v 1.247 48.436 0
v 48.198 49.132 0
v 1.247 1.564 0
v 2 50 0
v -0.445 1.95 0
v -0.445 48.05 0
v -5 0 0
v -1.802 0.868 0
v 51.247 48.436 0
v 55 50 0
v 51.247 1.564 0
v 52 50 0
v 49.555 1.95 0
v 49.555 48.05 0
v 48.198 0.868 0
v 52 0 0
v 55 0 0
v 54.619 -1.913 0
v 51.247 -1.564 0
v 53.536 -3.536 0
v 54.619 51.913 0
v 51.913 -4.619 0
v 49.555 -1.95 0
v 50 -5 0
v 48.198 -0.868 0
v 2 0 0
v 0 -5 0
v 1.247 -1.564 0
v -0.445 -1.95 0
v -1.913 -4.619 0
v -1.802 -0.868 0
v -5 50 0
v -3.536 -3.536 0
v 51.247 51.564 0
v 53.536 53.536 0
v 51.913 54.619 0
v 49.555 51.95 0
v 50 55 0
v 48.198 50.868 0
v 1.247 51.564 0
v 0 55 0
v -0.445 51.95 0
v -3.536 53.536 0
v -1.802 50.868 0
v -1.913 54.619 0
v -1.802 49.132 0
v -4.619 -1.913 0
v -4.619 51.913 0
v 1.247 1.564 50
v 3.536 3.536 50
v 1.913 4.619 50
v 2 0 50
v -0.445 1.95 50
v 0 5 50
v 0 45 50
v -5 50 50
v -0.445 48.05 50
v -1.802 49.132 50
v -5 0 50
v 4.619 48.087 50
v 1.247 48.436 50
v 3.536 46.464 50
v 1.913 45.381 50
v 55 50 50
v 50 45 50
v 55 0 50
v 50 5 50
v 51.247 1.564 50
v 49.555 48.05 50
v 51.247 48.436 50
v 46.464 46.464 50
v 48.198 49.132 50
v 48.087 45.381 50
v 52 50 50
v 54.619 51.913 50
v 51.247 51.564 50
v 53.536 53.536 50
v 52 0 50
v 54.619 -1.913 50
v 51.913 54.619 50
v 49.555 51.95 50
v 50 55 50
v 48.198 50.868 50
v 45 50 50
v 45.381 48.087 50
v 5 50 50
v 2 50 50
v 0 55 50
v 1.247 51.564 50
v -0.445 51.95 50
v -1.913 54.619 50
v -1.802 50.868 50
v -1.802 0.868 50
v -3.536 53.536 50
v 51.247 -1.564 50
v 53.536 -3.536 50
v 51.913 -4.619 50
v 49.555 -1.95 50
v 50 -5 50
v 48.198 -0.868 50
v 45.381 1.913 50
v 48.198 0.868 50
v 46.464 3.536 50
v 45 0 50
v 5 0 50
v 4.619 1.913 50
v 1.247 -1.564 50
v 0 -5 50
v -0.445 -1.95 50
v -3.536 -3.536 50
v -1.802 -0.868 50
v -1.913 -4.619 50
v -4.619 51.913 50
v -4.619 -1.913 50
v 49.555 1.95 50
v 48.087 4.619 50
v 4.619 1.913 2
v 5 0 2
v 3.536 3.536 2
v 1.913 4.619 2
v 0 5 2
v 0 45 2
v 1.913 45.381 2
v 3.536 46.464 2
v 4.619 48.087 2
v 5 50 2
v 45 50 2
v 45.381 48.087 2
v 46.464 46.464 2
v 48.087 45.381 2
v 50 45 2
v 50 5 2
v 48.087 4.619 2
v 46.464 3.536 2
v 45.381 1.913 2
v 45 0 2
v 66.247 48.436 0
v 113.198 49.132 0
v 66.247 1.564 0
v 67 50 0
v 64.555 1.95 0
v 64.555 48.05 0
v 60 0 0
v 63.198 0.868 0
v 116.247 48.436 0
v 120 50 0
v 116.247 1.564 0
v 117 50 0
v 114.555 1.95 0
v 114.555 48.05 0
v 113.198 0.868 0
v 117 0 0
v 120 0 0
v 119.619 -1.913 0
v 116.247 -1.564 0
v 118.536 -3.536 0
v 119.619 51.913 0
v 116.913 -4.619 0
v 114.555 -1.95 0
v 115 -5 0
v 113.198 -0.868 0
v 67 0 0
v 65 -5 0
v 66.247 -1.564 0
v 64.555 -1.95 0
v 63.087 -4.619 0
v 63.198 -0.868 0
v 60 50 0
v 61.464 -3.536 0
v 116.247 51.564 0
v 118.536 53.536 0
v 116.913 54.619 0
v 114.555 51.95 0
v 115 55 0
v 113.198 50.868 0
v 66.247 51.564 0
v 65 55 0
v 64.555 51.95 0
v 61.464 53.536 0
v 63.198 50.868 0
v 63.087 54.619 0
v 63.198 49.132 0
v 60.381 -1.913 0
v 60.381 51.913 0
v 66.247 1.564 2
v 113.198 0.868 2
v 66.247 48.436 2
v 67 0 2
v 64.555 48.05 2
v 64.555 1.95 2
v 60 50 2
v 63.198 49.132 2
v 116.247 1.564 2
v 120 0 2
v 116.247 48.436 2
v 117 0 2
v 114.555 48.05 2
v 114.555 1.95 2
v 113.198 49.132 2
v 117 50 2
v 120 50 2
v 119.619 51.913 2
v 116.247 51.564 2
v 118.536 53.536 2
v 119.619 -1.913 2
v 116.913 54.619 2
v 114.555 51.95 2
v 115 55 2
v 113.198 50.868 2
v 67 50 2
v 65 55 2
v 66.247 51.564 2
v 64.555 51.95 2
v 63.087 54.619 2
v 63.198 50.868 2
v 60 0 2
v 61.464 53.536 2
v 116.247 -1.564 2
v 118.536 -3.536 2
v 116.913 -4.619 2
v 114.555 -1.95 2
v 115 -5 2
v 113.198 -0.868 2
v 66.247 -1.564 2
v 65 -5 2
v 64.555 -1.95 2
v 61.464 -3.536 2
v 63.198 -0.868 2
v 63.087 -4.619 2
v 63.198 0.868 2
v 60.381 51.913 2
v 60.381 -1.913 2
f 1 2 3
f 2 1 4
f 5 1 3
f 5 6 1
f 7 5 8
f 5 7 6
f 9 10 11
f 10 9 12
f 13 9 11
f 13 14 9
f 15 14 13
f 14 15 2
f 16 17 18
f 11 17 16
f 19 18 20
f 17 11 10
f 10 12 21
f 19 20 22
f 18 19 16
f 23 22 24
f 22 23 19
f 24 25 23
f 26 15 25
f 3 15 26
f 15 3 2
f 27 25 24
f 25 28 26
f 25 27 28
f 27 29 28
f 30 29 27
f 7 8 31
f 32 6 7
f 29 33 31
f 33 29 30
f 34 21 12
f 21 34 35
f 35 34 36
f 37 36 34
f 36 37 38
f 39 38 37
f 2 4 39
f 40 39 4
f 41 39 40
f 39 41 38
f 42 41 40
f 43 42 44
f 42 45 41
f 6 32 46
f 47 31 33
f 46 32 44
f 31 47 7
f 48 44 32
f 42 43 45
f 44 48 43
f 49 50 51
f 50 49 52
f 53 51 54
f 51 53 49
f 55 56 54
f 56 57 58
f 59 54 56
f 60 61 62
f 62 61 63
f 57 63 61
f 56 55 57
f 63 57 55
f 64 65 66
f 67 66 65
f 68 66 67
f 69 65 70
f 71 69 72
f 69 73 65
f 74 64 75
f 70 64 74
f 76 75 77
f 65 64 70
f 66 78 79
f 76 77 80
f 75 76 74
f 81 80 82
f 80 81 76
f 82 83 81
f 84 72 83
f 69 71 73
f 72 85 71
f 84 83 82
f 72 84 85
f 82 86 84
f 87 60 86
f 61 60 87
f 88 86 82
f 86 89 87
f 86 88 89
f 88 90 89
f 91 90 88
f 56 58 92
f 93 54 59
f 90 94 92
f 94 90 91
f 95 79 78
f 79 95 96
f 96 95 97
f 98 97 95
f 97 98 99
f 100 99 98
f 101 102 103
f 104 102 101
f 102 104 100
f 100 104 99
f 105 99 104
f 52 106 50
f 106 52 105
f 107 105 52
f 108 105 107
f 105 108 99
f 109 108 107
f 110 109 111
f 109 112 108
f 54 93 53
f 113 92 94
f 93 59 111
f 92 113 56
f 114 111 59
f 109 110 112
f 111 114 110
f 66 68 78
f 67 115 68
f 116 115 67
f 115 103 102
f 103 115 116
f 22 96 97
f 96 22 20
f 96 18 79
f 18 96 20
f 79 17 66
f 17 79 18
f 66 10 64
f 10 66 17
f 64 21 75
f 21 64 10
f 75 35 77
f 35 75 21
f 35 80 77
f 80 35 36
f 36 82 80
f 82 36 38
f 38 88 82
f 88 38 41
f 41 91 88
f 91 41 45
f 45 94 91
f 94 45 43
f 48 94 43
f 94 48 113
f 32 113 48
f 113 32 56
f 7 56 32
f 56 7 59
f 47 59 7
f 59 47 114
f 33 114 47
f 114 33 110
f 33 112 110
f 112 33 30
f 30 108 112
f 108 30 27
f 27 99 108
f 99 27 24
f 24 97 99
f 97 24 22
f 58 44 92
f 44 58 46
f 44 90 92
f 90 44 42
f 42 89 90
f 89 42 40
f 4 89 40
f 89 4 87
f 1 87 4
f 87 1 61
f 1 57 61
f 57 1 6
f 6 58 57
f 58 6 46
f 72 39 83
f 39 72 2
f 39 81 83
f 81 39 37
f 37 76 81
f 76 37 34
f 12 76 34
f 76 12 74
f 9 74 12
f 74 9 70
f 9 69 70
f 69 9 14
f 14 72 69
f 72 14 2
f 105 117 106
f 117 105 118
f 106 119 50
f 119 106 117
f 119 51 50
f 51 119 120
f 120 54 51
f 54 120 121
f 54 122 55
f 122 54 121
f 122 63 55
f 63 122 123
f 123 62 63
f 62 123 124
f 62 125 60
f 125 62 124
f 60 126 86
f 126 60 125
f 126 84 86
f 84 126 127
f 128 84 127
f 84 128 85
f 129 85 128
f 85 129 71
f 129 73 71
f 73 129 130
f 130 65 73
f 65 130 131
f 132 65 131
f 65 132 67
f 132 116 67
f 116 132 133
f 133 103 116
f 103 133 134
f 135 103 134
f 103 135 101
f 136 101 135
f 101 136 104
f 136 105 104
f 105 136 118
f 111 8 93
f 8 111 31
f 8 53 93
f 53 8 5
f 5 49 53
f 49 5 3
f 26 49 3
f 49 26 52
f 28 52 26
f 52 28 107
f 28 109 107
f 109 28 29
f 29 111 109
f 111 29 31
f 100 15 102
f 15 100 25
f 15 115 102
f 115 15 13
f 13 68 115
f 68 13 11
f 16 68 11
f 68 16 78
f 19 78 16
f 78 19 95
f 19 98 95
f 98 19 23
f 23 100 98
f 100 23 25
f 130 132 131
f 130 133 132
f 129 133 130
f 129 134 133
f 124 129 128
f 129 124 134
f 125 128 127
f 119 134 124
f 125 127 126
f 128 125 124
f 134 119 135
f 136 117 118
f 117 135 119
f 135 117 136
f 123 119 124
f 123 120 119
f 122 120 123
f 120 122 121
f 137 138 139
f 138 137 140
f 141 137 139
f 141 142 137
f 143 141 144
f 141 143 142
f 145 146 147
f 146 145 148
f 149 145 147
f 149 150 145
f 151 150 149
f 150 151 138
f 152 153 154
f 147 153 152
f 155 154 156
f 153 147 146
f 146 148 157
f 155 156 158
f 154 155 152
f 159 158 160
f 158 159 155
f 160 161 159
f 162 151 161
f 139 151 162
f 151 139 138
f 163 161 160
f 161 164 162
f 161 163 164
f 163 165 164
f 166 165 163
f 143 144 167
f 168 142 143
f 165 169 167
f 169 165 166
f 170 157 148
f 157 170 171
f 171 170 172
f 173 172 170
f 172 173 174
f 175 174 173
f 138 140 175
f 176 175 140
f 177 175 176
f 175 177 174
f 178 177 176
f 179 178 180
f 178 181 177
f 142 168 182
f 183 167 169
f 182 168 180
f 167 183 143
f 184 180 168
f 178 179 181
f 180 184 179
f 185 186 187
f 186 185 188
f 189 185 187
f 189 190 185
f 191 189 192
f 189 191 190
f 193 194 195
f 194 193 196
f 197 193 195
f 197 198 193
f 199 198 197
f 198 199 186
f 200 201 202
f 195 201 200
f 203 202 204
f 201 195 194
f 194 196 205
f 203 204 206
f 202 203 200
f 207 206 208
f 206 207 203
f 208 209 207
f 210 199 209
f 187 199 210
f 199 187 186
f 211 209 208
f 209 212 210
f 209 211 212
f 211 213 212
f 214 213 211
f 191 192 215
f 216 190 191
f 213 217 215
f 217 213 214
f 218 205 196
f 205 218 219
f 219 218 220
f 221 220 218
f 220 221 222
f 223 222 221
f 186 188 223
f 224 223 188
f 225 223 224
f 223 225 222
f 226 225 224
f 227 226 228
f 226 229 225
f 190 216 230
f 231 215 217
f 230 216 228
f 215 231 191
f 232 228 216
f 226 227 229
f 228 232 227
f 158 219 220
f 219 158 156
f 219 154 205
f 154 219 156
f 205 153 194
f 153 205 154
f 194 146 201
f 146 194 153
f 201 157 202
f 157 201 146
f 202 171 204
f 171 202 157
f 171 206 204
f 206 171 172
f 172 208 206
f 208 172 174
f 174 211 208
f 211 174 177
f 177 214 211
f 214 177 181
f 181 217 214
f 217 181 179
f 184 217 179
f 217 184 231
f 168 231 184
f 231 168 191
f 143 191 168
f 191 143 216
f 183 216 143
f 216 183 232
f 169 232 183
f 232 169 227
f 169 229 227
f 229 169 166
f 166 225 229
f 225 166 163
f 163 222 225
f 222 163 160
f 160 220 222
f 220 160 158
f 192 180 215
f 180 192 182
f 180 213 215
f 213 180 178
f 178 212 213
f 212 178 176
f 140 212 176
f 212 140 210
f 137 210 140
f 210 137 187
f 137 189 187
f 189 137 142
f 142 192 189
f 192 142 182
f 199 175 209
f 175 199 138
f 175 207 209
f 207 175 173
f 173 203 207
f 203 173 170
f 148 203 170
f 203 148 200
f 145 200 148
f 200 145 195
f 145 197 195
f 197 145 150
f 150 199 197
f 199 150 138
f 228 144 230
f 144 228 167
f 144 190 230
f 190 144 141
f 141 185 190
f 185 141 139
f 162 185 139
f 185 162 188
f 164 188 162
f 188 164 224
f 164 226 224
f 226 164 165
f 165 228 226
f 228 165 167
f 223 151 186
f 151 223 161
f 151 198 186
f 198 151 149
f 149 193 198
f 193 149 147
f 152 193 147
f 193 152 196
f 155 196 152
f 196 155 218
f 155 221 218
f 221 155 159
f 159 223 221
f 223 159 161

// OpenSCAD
//box length
box_length = 50;

//box_breadth
box_breadth = 50;

//box height
box_height = 50;

//outer radius for rounded box
radius_outer = 5;

//radius for screw holes
radius_hole = 2;

module faceplate(l,b,r_outer,r_hole) {
	difference() {
		minkowski() {
			circle(r_outer);
			square([l,b]);
		}
		circle(r_hole);
		translate([l,0,0])circle(r_hole);
		translate([0,b,0])circle(r_hole);
		translate([l,b,0])circle(r_hole);
	}
}

module inner_shape(l,b,r_outer) {
	difference() {
		square([l,b]);
		circle(r_outer);
		translate([l,0,0])circle(r_outer);
		translate([0,b,0])circle(r_outer);
		translate([l,b,0])circle(r_outer);
	}
}

module box(l,b,h,r_outer,r_hole) {
	union() {
		linear_extrude(height = h)
		{
			difference() {
				faceplate(l,b,r_outer,r_hole);
				inner_shape(l,b,r_outer,r_hole);
			}
		}
		linear_extrude(height = 2)faceplate(l,b,r_outer,r_hole);
	}
}

box(box_length,box_breadth,box_height,radius_outer,radius_hole);
translate([box_length+2*radius_outer+5,0,0])linear_extrude(height = 2)faceplate(box_length,box_breadth,radius_outer,radius_hole);
